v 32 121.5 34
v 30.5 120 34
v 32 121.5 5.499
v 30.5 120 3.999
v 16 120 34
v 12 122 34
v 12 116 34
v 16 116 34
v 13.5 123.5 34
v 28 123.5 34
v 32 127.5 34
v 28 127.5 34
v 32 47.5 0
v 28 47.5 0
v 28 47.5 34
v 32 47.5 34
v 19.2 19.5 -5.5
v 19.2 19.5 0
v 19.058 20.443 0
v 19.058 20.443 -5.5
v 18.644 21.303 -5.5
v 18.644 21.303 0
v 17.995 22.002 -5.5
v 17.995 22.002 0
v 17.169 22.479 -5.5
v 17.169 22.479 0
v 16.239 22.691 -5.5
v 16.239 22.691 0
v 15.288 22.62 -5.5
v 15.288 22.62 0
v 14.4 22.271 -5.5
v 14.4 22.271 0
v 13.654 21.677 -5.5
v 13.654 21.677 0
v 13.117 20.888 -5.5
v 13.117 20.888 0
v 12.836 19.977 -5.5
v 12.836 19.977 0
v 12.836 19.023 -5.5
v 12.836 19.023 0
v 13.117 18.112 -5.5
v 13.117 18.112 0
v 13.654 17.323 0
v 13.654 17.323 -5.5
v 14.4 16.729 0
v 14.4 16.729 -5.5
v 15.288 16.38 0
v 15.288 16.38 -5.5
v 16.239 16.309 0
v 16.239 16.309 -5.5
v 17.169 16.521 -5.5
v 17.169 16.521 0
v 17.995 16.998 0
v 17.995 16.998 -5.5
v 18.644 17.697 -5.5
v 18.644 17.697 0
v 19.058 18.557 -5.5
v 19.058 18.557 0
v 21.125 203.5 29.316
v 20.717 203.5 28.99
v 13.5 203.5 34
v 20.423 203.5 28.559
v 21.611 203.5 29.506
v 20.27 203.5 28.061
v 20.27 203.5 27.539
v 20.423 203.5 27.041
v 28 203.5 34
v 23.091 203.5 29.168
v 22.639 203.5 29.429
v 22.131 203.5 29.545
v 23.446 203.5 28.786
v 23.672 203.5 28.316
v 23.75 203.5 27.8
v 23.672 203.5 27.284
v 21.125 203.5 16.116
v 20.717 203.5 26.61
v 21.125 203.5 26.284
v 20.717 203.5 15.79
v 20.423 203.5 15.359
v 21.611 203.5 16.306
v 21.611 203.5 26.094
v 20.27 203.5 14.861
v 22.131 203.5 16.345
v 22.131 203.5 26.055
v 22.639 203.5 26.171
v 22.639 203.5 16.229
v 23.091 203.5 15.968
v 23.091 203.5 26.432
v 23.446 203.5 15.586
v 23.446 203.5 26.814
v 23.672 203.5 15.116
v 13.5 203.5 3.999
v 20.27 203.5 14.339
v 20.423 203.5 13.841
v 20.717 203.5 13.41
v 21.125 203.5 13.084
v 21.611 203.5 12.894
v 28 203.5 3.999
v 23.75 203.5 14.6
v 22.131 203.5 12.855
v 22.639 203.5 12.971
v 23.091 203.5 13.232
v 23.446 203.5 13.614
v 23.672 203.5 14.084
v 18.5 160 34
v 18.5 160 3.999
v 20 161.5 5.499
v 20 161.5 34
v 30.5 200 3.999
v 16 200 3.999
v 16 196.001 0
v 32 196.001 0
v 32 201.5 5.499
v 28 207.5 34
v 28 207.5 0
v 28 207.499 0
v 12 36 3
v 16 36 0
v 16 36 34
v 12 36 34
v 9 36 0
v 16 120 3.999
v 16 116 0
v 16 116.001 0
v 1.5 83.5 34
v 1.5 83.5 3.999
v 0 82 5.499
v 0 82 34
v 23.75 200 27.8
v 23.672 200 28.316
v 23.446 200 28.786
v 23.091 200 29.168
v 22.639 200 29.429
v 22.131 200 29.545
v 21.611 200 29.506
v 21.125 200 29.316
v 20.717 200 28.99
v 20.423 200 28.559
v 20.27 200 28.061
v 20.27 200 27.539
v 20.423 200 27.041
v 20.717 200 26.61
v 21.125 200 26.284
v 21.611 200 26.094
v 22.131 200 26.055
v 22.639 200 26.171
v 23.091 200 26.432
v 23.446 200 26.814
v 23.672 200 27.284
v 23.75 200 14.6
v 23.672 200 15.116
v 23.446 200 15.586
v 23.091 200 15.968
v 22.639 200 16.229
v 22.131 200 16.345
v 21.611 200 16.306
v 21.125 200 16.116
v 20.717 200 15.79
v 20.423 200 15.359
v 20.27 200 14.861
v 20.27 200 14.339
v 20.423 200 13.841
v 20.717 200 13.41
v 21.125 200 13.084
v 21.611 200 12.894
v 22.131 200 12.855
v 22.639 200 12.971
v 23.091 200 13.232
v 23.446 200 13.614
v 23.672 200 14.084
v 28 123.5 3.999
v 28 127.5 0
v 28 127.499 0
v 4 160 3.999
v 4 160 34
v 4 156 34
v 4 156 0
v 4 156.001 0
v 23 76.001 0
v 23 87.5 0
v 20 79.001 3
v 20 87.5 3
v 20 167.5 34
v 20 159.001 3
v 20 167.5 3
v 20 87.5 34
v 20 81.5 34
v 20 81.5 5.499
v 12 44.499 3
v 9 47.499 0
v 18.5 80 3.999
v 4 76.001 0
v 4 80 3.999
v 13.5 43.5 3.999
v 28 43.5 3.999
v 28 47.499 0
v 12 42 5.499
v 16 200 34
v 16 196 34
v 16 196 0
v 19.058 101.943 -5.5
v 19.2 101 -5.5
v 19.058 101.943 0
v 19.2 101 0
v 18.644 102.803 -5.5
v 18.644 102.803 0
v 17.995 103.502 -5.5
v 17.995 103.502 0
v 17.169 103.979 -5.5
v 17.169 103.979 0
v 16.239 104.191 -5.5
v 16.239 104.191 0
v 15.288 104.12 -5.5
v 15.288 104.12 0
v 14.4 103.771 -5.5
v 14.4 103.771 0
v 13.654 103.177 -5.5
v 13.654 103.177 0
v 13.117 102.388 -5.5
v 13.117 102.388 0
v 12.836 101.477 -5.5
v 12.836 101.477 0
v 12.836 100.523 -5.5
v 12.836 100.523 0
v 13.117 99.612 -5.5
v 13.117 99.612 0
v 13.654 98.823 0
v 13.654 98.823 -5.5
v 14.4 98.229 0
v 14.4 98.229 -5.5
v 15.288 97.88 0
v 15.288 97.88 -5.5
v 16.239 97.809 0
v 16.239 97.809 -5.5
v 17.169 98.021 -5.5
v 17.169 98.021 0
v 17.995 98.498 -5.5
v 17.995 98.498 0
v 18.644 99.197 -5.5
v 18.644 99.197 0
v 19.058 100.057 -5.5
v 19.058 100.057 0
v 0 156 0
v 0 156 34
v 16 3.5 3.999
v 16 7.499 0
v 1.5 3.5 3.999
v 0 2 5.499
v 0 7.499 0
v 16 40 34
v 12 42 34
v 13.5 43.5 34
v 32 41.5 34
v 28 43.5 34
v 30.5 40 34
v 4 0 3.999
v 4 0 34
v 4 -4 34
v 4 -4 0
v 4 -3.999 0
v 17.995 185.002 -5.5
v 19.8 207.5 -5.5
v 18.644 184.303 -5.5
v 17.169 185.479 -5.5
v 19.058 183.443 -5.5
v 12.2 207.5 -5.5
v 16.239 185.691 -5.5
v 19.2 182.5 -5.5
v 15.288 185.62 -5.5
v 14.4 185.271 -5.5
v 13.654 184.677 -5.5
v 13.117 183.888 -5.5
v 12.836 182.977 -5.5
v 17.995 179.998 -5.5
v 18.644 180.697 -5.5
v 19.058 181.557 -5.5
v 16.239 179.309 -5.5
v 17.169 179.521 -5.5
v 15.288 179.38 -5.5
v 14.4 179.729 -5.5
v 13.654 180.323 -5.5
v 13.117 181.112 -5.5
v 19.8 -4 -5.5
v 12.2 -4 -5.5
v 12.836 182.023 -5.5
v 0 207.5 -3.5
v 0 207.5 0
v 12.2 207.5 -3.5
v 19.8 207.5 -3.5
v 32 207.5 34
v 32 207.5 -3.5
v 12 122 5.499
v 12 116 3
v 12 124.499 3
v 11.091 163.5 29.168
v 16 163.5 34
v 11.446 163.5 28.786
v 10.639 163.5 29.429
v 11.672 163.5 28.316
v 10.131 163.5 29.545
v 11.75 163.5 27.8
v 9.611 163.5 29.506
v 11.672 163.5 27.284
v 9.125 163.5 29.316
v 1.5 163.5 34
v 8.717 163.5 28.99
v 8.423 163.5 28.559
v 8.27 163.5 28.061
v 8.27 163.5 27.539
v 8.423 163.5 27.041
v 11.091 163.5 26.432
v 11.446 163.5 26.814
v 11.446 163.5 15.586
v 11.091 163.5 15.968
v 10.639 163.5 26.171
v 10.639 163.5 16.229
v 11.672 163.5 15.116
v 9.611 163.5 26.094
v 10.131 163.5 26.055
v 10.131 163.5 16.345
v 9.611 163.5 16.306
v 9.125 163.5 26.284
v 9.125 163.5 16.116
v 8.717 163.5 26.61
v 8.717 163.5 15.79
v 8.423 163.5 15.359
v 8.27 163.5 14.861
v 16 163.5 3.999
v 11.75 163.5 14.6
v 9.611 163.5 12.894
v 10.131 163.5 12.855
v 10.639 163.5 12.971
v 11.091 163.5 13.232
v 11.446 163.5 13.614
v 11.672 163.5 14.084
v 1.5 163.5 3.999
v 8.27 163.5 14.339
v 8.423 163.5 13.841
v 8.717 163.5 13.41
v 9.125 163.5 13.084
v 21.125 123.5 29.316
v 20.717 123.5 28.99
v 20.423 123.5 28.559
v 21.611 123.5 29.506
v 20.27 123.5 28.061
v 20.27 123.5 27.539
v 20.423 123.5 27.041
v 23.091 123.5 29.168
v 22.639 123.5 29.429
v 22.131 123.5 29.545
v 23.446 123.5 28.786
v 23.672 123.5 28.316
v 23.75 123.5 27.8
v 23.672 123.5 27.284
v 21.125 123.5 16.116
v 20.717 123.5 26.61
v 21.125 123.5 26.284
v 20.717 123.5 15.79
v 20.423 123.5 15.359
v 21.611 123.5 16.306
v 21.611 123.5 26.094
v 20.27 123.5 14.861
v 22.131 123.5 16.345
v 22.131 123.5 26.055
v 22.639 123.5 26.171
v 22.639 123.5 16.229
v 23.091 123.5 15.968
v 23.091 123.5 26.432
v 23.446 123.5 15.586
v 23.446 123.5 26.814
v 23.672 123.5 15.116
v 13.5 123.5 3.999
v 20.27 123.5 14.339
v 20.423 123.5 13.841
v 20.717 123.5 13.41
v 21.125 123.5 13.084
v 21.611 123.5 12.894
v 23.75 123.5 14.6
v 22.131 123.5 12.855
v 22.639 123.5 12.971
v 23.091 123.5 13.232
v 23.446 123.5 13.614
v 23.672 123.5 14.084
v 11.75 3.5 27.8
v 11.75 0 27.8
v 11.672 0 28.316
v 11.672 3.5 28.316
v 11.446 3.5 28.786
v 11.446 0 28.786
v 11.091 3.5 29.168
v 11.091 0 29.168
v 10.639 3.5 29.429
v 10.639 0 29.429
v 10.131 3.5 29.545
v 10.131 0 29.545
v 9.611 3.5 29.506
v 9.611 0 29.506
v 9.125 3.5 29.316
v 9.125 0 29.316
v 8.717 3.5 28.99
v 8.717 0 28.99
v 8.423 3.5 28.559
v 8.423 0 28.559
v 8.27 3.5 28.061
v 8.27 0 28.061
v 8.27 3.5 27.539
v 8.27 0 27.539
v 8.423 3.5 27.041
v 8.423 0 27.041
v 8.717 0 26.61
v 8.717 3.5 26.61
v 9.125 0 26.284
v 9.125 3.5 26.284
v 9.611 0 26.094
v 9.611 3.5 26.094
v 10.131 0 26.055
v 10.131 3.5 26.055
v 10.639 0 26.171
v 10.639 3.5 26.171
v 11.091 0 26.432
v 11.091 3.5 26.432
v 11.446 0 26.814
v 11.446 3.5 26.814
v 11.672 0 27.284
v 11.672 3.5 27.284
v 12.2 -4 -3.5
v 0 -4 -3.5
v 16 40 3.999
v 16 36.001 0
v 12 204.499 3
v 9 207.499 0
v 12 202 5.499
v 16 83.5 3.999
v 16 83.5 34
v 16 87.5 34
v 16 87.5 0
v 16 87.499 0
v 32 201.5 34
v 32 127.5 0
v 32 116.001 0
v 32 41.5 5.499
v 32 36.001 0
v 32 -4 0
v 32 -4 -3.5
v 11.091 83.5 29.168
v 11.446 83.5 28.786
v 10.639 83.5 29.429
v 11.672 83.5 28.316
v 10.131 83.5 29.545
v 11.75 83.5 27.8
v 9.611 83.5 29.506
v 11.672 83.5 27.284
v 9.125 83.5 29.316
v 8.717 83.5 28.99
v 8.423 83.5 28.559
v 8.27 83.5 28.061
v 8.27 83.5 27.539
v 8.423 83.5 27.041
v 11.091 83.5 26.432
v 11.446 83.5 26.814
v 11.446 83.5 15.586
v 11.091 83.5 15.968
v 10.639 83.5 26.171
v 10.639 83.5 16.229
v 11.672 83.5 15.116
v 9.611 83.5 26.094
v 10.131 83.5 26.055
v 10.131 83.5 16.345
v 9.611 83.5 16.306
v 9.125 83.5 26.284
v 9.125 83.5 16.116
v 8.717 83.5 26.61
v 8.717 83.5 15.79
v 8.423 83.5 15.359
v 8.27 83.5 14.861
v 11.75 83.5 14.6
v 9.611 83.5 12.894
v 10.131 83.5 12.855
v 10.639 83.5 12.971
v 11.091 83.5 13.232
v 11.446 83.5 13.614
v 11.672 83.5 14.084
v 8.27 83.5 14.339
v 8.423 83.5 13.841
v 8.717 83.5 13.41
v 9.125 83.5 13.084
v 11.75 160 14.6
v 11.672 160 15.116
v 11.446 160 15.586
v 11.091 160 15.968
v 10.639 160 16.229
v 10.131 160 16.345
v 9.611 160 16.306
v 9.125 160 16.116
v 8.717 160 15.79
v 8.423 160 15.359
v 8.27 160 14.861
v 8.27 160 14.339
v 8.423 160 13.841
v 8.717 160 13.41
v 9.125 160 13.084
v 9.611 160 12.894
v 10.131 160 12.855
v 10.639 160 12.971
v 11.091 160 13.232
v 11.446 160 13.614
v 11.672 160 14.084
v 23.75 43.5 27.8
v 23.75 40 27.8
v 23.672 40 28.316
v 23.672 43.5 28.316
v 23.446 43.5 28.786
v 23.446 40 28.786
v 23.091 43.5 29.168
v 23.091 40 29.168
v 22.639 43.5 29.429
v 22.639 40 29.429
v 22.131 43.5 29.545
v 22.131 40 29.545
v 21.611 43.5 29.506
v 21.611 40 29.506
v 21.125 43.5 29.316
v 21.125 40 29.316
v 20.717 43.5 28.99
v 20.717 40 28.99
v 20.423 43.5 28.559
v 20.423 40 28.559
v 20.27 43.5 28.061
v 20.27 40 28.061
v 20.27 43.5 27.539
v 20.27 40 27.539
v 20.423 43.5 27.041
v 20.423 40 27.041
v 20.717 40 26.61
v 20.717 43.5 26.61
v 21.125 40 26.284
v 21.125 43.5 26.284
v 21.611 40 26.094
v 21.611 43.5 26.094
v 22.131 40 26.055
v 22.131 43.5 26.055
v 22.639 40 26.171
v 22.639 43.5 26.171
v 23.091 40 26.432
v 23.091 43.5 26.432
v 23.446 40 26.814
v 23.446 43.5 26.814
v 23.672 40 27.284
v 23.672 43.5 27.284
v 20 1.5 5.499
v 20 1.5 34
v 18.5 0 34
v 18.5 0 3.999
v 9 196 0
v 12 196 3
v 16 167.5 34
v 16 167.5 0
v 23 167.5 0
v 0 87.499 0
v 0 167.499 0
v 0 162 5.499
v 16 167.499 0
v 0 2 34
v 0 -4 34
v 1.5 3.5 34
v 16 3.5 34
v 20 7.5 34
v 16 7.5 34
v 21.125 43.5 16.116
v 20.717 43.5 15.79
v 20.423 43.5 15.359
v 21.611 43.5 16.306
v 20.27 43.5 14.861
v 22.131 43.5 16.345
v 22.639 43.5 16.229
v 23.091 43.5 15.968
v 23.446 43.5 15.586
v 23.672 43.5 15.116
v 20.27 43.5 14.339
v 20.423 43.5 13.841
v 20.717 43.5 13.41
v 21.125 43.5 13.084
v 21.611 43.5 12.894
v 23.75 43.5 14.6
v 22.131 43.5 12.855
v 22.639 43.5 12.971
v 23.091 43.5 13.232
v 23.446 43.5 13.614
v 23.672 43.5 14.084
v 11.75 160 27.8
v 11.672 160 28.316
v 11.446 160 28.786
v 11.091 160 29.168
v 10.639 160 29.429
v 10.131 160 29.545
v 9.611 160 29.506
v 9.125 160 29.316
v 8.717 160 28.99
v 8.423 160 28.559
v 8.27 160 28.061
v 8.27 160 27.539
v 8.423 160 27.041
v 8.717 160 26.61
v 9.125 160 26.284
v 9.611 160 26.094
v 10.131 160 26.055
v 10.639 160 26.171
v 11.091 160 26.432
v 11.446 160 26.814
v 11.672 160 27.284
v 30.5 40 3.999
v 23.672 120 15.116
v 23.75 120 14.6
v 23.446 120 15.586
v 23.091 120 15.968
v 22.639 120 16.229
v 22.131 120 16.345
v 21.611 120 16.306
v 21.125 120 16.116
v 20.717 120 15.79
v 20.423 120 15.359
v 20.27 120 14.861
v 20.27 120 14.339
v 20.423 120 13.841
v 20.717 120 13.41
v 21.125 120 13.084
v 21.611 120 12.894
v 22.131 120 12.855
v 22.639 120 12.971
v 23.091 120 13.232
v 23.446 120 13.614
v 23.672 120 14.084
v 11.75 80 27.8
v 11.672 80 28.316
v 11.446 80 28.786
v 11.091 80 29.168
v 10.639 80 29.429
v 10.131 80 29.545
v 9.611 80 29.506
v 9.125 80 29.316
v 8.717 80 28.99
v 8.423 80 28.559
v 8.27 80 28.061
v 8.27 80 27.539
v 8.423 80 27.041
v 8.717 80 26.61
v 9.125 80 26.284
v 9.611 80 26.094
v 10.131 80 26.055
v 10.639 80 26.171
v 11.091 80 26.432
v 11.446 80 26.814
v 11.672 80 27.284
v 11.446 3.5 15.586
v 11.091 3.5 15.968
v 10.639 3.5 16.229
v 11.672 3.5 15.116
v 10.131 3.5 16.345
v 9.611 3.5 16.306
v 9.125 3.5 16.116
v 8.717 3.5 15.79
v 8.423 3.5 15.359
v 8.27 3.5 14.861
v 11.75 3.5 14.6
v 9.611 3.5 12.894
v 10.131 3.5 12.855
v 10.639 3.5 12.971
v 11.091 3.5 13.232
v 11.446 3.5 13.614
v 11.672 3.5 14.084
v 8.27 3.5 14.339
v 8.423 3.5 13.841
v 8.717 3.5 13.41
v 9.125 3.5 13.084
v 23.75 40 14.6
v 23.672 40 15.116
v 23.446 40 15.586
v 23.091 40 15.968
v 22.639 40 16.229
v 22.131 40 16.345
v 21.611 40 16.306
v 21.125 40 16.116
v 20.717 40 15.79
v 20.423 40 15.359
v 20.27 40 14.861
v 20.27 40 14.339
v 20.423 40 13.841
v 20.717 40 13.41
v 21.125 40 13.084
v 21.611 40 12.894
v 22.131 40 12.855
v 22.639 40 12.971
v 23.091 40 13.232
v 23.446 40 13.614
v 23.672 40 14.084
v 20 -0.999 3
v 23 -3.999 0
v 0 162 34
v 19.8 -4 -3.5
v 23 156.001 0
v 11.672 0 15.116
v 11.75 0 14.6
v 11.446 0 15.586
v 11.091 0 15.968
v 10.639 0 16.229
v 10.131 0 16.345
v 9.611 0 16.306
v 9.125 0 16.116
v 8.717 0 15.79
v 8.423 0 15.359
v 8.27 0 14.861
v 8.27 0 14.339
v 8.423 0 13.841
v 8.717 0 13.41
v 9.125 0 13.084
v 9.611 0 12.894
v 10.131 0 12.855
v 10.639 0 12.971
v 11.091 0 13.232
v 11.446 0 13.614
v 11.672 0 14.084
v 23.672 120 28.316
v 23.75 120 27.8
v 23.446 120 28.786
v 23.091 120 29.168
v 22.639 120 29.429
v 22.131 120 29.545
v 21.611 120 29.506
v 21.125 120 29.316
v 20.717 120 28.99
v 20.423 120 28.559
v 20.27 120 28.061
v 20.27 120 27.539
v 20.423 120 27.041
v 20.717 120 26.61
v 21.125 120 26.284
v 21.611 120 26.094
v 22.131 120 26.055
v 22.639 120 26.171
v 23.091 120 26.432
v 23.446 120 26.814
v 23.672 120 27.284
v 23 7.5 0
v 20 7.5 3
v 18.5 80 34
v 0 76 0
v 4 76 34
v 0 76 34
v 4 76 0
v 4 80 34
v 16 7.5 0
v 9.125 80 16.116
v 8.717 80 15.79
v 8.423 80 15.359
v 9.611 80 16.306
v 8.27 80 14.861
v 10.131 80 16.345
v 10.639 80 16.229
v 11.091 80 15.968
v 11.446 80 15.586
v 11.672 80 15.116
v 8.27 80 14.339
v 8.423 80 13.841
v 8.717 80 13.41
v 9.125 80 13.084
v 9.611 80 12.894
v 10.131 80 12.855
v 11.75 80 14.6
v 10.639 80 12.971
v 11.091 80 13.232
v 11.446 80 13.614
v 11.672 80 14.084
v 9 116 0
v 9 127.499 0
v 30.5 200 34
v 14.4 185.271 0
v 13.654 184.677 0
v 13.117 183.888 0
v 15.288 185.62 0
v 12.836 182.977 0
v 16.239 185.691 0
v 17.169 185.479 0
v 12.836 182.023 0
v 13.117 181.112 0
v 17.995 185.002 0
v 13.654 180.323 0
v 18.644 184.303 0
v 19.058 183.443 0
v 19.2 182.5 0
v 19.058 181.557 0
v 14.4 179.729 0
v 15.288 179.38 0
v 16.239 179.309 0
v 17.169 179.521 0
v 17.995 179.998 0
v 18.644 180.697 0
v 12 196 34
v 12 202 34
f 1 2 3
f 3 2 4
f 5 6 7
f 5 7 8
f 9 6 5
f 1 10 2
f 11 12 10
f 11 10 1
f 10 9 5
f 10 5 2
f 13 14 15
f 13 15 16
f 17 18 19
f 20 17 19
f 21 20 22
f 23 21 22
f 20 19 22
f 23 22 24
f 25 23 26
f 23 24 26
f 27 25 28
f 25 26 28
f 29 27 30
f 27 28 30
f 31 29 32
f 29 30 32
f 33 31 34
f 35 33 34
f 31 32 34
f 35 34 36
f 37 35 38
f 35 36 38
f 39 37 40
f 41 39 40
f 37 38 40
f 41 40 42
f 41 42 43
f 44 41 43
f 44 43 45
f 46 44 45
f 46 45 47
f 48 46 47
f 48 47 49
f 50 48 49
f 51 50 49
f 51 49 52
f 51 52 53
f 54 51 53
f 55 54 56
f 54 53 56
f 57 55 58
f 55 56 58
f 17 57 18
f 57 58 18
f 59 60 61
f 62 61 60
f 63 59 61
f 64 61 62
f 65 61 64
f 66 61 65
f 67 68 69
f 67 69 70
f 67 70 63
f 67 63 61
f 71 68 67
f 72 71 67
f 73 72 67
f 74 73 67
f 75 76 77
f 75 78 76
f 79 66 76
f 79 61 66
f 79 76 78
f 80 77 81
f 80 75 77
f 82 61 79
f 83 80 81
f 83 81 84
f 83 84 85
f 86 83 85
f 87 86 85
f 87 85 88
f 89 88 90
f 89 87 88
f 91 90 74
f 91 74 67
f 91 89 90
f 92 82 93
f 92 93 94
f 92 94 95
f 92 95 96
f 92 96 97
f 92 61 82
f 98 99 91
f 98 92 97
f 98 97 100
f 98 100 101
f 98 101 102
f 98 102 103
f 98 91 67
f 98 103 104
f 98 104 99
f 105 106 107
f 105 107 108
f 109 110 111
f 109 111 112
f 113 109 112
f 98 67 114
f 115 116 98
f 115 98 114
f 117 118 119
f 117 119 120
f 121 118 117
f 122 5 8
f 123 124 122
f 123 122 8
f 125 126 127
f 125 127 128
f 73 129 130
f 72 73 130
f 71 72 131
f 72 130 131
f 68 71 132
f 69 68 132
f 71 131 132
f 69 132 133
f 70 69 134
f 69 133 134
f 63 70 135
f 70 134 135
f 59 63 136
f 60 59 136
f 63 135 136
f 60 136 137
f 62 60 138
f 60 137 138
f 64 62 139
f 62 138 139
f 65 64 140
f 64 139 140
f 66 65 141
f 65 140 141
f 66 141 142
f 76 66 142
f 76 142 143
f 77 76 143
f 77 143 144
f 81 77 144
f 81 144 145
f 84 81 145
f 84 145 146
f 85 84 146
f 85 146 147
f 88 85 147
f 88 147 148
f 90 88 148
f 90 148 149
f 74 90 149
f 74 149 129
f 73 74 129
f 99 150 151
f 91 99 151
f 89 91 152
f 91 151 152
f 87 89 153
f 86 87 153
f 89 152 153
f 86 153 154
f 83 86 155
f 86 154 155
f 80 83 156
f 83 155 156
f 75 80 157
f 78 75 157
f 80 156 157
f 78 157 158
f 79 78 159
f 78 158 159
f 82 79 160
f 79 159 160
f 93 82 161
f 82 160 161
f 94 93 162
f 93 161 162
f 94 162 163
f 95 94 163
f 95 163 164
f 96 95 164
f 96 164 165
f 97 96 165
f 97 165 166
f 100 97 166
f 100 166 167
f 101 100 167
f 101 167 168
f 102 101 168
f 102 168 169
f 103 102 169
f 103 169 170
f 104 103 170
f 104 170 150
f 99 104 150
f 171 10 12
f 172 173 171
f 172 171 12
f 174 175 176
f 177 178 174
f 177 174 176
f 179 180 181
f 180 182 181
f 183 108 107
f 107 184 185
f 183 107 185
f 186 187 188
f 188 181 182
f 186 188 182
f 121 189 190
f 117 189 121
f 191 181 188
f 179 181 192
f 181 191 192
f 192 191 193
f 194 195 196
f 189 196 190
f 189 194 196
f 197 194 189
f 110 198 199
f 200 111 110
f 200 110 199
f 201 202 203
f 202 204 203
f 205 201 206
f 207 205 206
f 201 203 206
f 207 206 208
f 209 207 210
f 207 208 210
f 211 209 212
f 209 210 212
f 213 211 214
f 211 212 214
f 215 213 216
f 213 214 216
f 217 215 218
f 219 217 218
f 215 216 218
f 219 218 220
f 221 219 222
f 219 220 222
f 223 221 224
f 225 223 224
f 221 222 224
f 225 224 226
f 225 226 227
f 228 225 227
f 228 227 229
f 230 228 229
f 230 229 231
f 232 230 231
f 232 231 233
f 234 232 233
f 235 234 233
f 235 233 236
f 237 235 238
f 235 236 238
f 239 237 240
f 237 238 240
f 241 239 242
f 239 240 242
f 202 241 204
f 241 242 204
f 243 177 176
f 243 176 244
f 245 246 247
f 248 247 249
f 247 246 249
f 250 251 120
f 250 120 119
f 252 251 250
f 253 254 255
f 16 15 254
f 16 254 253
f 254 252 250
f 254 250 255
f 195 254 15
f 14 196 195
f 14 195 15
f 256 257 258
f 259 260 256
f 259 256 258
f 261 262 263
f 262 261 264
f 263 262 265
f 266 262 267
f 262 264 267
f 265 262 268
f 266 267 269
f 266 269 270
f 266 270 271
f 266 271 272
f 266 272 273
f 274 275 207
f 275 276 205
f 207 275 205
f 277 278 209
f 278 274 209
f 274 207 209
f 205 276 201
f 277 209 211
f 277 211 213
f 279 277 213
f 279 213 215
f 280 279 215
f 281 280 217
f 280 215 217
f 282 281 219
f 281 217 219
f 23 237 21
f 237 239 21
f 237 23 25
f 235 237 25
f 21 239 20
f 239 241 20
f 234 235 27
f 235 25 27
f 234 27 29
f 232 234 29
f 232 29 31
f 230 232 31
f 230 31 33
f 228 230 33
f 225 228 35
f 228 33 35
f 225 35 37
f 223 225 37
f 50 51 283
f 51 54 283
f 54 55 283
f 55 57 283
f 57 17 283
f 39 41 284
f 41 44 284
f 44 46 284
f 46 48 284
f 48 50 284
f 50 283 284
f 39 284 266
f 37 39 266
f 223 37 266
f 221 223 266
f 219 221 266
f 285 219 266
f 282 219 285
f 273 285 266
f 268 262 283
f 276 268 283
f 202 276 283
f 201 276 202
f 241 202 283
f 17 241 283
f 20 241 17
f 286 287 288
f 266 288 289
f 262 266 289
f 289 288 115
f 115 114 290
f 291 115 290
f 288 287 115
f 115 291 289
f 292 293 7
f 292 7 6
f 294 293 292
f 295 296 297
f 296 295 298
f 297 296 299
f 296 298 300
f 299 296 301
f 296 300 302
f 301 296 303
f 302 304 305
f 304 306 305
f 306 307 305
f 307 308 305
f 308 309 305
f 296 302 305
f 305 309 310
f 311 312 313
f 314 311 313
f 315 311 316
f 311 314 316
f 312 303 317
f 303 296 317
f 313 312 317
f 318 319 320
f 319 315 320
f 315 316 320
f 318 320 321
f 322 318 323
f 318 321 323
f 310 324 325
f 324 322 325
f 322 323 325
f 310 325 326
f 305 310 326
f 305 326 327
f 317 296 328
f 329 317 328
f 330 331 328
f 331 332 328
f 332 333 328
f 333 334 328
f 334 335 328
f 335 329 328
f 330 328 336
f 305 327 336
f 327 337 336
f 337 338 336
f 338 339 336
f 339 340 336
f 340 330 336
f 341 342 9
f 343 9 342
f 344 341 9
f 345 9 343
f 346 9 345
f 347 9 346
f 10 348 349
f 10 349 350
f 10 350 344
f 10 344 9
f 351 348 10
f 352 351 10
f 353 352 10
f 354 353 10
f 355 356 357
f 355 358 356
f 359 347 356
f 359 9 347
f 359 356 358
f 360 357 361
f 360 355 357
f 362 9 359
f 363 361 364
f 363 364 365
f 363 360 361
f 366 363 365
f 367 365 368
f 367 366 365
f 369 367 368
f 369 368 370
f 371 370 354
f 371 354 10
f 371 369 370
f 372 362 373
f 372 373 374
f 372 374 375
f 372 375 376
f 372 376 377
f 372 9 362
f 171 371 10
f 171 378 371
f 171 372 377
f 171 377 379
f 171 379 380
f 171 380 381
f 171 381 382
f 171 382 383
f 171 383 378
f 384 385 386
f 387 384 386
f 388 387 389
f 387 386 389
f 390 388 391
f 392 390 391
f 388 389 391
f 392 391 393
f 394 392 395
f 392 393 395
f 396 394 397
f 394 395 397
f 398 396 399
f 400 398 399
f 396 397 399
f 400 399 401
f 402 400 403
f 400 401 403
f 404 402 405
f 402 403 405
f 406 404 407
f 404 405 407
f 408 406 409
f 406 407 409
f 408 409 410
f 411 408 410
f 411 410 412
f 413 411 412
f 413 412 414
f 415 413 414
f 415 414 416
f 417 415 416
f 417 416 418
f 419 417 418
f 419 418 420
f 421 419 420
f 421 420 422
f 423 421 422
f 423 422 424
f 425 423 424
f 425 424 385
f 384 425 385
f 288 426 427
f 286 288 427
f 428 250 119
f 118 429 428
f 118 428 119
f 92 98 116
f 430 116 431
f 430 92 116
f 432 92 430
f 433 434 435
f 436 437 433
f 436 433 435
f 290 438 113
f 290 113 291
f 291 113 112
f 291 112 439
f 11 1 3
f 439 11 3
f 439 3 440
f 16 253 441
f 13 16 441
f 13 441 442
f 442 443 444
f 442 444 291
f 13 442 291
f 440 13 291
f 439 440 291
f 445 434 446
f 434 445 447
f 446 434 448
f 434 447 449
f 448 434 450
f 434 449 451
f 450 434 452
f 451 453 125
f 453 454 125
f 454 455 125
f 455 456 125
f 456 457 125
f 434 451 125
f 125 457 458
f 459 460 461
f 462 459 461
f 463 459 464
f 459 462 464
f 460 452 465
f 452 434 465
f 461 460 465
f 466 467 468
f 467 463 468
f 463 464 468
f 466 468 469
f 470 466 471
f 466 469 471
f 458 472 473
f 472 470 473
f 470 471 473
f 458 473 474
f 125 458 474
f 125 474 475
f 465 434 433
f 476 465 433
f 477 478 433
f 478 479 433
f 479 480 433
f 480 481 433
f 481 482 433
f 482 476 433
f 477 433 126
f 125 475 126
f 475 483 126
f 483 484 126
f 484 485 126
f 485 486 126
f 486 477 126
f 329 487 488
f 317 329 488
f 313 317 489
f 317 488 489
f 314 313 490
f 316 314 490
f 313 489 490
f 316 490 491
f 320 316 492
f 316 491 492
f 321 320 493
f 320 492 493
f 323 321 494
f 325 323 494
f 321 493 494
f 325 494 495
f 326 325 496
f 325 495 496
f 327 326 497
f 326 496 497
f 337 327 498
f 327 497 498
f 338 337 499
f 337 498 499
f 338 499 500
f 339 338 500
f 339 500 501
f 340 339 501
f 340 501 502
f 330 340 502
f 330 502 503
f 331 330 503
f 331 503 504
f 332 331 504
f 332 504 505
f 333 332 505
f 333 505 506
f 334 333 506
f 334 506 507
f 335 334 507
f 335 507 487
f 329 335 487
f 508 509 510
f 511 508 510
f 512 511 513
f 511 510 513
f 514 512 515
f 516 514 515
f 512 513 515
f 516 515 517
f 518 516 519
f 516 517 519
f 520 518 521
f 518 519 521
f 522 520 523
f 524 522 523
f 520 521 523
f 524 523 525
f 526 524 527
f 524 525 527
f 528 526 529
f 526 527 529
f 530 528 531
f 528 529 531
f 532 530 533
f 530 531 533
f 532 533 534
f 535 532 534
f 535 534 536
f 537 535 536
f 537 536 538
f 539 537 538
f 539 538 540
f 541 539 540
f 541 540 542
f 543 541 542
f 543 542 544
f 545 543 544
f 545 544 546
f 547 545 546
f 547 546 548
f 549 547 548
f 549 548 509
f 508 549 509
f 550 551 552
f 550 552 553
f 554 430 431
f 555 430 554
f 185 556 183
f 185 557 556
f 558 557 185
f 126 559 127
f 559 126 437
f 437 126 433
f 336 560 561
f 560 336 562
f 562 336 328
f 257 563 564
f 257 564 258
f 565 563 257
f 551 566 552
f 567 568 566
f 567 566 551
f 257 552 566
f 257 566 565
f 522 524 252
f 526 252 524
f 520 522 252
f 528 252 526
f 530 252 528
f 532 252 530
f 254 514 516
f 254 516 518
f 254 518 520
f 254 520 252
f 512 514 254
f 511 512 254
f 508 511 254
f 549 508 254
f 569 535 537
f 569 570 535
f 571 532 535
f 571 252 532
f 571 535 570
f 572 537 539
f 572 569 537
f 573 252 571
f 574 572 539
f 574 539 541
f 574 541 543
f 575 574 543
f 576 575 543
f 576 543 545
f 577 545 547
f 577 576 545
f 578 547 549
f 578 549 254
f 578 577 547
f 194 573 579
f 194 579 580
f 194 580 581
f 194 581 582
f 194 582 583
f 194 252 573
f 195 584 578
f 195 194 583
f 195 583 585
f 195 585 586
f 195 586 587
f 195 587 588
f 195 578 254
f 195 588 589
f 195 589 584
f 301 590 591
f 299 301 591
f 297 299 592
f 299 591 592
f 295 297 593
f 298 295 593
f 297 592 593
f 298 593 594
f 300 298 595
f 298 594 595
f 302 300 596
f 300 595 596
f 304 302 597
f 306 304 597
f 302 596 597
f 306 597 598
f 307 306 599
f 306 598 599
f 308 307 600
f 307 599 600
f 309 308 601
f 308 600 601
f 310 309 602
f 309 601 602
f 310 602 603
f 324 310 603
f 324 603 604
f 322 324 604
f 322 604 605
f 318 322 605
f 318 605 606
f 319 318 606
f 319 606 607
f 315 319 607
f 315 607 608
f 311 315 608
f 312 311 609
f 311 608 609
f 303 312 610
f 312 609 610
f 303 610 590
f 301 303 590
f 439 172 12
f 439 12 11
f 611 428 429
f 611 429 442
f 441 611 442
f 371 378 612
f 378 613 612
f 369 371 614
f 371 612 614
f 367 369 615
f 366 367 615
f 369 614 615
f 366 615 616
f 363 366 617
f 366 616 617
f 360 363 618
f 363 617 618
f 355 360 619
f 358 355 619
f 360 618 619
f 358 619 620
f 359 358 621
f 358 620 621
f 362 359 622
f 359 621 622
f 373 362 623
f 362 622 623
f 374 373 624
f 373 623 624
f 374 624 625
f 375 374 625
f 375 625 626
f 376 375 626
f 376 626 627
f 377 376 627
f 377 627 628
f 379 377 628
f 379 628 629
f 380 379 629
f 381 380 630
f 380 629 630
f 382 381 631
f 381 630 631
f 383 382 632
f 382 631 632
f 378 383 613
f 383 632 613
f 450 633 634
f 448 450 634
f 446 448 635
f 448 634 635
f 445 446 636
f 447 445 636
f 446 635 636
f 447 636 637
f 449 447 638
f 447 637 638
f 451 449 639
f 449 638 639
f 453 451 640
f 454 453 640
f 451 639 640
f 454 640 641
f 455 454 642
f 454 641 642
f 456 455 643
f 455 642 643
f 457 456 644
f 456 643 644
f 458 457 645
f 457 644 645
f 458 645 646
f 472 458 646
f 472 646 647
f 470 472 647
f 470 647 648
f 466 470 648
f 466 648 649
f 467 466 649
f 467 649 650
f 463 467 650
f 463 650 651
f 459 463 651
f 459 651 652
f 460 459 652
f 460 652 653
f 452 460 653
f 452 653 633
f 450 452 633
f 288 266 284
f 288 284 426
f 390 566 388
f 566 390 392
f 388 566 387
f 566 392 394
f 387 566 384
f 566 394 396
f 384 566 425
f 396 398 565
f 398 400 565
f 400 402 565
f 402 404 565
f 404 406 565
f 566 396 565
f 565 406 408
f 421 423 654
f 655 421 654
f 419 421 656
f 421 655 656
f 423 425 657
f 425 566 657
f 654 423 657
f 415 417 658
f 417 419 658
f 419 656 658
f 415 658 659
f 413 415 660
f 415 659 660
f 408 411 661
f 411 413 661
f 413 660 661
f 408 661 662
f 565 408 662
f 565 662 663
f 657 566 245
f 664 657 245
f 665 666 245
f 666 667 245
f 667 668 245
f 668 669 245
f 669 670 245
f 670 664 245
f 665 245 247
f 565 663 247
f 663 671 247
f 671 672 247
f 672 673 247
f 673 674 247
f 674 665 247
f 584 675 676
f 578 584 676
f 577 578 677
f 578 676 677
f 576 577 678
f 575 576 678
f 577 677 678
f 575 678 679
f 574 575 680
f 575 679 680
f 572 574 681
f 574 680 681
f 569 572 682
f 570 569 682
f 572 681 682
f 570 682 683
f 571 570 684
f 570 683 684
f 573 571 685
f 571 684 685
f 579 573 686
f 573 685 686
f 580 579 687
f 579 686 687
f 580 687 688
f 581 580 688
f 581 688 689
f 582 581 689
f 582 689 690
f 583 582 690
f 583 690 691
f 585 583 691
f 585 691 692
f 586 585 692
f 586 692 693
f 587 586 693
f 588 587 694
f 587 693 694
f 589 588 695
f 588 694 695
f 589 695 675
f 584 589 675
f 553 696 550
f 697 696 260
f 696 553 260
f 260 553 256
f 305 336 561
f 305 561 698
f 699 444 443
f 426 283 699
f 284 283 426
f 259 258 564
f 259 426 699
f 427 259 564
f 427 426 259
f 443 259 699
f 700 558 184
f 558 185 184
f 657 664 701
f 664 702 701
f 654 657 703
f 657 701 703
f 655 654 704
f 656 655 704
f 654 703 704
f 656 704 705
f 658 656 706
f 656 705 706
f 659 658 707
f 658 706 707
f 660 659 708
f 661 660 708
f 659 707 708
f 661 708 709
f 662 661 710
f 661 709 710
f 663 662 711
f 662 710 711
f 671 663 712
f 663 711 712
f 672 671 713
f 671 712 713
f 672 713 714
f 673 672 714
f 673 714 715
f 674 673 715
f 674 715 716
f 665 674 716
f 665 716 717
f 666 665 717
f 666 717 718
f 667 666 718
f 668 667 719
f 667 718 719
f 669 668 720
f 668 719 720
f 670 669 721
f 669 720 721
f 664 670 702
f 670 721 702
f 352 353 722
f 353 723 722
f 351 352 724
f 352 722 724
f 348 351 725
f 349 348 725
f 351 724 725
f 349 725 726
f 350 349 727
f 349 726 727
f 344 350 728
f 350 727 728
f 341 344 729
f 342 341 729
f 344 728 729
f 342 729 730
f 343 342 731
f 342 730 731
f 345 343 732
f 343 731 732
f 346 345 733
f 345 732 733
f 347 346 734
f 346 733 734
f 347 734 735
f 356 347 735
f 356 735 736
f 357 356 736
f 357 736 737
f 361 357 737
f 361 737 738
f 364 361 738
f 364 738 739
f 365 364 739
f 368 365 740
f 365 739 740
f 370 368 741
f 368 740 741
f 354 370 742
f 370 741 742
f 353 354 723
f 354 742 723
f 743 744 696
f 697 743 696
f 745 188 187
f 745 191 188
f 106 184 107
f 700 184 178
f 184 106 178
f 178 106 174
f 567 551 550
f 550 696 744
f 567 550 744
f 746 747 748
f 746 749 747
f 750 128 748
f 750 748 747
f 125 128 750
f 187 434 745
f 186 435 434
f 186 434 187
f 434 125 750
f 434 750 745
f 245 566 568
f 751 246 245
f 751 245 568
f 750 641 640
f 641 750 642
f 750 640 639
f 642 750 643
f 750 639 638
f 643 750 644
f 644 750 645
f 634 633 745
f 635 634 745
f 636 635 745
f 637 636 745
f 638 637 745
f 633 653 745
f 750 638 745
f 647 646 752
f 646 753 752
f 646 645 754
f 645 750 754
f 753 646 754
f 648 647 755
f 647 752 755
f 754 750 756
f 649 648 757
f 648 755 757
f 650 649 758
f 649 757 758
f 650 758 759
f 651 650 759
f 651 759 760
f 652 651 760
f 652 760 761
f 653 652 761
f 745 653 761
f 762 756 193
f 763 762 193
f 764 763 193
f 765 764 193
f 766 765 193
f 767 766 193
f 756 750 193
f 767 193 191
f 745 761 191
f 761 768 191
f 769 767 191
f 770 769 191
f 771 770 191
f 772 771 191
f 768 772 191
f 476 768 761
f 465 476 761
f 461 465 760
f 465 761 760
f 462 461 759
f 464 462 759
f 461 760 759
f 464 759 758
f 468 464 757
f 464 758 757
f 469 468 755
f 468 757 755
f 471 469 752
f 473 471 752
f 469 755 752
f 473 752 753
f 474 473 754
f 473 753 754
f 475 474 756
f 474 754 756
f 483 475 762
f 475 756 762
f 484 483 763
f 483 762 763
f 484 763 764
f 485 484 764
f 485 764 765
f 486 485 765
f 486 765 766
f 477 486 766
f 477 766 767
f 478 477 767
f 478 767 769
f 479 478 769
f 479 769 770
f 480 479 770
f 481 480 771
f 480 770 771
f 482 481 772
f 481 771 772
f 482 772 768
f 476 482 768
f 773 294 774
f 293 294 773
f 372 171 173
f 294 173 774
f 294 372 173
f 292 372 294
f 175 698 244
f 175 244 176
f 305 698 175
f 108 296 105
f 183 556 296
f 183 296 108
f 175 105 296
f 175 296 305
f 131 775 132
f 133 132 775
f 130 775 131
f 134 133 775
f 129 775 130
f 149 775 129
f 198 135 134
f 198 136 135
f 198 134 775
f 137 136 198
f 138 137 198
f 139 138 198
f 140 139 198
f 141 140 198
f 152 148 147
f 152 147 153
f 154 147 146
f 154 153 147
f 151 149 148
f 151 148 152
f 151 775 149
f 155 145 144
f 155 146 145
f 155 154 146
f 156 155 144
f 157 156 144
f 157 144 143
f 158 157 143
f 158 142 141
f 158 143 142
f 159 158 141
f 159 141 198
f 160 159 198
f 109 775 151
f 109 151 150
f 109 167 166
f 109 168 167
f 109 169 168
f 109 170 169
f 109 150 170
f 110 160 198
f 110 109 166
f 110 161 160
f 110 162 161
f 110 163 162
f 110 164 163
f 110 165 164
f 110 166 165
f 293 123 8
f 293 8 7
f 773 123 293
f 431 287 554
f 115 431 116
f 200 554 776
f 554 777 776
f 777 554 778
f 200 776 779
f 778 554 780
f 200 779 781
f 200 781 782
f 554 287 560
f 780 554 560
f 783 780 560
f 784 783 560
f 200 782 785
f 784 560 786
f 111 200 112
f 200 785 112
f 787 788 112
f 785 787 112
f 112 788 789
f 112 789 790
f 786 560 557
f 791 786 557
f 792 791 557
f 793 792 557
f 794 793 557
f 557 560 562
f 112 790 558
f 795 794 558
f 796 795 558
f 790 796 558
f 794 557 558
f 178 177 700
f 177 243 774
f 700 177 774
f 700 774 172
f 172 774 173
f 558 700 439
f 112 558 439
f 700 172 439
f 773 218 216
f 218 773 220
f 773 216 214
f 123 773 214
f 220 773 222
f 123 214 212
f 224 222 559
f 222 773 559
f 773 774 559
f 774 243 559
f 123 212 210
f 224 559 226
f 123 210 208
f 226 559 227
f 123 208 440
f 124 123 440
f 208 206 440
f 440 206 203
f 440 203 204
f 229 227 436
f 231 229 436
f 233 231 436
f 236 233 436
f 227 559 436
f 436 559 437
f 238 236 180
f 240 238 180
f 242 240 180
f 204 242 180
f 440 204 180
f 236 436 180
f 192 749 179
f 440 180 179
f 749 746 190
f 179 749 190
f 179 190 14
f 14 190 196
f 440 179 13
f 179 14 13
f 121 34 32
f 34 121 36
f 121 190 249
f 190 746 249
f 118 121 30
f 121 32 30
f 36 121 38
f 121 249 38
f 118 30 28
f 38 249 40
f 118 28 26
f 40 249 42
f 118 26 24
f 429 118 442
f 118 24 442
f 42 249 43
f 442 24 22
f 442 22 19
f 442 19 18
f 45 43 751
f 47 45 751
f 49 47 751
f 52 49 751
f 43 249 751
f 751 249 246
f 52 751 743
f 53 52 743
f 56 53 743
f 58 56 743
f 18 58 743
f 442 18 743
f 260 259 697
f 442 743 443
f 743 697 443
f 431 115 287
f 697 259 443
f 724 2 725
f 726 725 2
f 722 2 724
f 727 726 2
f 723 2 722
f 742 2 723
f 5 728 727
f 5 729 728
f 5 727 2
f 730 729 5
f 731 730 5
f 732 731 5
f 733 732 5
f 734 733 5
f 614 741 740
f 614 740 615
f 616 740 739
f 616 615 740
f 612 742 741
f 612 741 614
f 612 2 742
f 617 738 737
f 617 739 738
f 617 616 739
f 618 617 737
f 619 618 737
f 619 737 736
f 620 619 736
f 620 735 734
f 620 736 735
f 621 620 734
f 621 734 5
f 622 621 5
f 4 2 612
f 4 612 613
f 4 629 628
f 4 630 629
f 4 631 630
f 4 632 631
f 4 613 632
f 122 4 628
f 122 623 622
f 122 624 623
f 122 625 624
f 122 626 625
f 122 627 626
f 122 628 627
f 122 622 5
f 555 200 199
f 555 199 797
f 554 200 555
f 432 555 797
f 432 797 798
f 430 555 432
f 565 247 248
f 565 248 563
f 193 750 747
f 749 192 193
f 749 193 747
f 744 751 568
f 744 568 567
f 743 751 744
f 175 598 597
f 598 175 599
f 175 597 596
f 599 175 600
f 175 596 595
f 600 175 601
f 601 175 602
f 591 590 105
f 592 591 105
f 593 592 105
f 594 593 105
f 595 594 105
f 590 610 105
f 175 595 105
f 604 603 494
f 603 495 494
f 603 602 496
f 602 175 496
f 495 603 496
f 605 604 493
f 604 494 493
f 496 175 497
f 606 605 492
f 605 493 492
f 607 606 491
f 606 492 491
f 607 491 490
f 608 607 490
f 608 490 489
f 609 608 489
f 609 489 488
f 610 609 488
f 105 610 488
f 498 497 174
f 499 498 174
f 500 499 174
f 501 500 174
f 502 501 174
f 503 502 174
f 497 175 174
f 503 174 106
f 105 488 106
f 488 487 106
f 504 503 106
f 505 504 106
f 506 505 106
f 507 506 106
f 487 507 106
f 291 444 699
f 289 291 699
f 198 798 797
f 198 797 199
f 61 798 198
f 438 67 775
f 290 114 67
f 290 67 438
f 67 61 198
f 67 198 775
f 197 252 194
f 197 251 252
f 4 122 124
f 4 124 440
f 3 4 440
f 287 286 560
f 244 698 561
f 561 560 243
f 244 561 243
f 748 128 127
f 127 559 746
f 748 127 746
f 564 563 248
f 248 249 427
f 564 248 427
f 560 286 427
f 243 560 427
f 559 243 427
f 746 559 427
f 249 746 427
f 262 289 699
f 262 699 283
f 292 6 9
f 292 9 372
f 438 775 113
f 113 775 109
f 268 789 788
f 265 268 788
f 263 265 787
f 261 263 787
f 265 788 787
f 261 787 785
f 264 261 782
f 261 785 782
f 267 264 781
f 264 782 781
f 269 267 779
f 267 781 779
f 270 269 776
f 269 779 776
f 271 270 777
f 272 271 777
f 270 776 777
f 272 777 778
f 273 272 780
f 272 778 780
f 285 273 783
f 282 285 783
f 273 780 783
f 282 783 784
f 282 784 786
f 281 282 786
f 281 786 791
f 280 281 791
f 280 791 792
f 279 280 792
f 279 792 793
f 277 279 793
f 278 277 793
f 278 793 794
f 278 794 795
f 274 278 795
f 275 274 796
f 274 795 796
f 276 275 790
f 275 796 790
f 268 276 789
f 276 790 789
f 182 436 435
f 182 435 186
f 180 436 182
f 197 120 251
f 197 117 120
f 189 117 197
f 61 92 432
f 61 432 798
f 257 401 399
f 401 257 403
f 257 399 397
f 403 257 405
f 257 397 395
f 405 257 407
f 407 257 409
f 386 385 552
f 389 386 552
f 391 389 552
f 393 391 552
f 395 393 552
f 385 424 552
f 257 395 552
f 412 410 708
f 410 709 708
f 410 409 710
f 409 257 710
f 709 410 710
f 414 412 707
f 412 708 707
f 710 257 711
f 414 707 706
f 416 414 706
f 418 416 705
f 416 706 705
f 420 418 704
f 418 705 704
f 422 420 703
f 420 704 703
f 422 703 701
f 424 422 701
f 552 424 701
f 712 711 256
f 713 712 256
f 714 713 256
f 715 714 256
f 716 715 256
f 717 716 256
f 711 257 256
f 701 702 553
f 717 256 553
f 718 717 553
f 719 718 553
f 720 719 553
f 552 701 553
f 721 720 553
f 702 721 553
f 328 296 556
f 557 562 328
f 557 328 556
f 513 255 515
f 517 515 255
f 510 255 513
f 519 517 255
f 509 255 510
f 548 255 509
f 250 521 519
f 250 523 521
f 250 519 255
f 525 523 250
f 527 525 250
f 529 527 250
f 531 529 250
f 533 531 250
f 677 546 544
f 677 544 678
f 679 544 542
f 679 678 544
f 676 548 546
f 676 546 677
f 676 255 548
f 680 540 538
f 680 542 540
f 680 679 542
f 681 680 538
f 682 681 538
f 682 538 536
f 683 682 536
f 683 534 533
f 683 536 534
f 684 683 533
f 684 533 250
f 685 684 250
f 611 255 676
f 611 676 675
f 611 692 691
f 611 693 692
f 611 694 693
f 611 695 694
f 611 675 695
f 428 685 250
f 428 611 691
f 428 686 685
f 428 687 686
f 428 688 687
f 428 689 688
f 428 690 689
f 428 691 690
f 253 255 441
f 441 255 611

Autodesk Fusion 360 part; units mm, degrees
sketch "Sketch1" plane through (0, 0, 0) normal (0, 0, 1) x (1, 0, 0)
  line L0 (0, 0) -> (20, 0)
  line L1 (20, 0) -> (20, 3.5)
  line L2 (20, 3.5) -> (0, 3.5)
  line L3 (0, 3.5) -> (0, 0)
  line L4 (0, 0) -> (4, 0)
  line L5 (4, 0) -> (4, -4)
  line L6 (4, -4) -> (0, -4)
  line L7 (0, -4) -> (0, 0)
  line L8 (20, 3.5) -> (16, 3.5)
  line L9 (16, 3.5) -> (16, 7.5)
  line L10 (16, 7.5) -> (20, 7.5)
  line L11 (20, 7.5) -> (20, 3.5)
  dimension "d1" = 3.5
  dimension "d2" = 20
  dimension "d3" = 4
  dimension "d4" = 4
  dimension "d5" = 4
  dimension "d6" = 4
extrude "Extrude1" add sketch "Sketch1" along normal blind 34 makes body 1
sketch "Sketch2" plane through (0, 0, 0) normal (0, -1, 0) x (1, 0, 0)
  line L0 (4, 0) -> (20, 0)
  line L1 (20, 0) -> (20, 34)
  line L2 (20, 34) -> (4, 34)
  line L3 (4, 34) -> (4, 0)
  circle A0 centre (10, 27.8) radius 1.75
  circle A1 centre (10, 14.6) radius 1.75
  line L4 (16, 34) -> (4, 34) construction
  point P0 (16, 34)
  point P1 (10, 34)
  dimension "d9" = 3.5
  dimension "d10" = 6.2
  dimension "d11" = 13.2
  dimension "d12" = 3.5
extrude "Extrude2" cut sketch "Sketch2" against normal blind 15 contours A0 | A1 bodies 1
pattern_linear "R-Pattern1" count 3 spacing 80 along (0, 1, 0) of bodies 1 makes body 2 at (8.5369, 83.5, 4.298) makes body 3 at (8.5369, 163.5, 4.298)
sketch "Sketch3" plane through (0, 0, 0) normal (0, 0, 1) x (1, 0, 0)
  line L0 (12, 43.5) -> (32, 43.5)
  line L1 (32, 43.5) -> (32, 40)
  line L2 (32, 40) -> (12, 40)
  line L3 (12, 40) -> (12, 43.5)
  line L4 (12, 40) -> (16, 40)
  line L5 (16, 40) -> (16, 36)
  line L6 (16, 36) -> (12, 36)
  line L7 (12, 36) -> (12, 40)
  line L8 (32, 43.5) -> (28, 43.5)
  line L9 (28, 43.5) -> (28, 47.5)
  line L10 (28, 47.5) -> (32, 47.5)
  line L11 (32, 47.5) -> (32, 43.5)
  line L12 (0, 3.5) -> (0, -4)
  line L13 (4, 0) -> (20, 0)
  dimension "d19" = 20
  dimension "d20" = 3.5
  dimension "d21" = 4
  dimension "d22" = 4
  dimension "d23" = 4
  dimension "d24" = 4
  dimension "d25" = 12
  dimension "d26" = 40
extrude "Extrude3" add sketch "Sketch3" along normal blind 34 separate body makes body 4
sketch "Sketch4" plane through (0, 40, 0) normal (0, -1, 0) x (1, 0, 0)
  line L0 (16, 0) -> (32, 0)
  line L1 (32, 0) -> (32, 34)
  line L2 (32, 34) -> (16, 34)
  line L3 (16, 34) -> (16, 0)
  circle A0 centre (22, 27.8) radius 1.75
  circle A1 centre (22, 14.6) radius 1.75
  line L4 (28, 34) -> (16, 34)
  point P0 (28, 34)
  point P1 (22, 34)
  dimension "d29" = 3.5
  dimension "d30" = 3.5
  dimension "d31" = 6.2
  dimension "d32" = 13.2
extrude "Extrude4" cut sketch "Sketch4" against normal blind 5 contours A0 | A1 bodies 4
pattern_linear "R-Pattern2" count 3 spacing 80 along (0, 1, 0) of bodies 4 makes body 5 at (20.5369, 123.5, 4.298) makes body 6 at (20.5369, 203.5, 4.298)
sketch "Sketch5" plane through (0, 0, 0) normal (0, -1, 0) x (1, 0, 0)
  circle A0 centre (10, 27.8) radius 1.75
  circle A1 centre (10, 14.6) radius 1.75
  line L0 (4, 0) -> (20, 0)
  line L1 (20, 0) -> (20, 34)
  line L2 (20, 34) -> (4, 34)
  line L3 (4, 34) -> (4, 0)
  line L4 (0, 0) -> (32, 0)
  line L5 (32, 0) -> (32, -3.5)
  line L6 (32, -3.5) -> (0, -3.5)
  line L7 (0, -3.5) -> (0, 0)
  line L8 (12.2, -3.5) -> (19.8, -3.5)
  line L9 (19.8, -3.5) -> (19.8, -5.5)
  line L10 (19.8, -5.5) -> (12.2, -5.5)
  line L11 (12.2, -5.5) -> (12.2, -3.5)
  point P0 (32, 0)
  point P1 (16, -3.5)
  point P2 (16, -3.5)
  dimension "d39" = 3.5
  dimension "d40" = 7.6
  dimension "d41" = 2
extrude "Extrude5" add sketch "Sketch5" along normal blind -207.5 and the other way up to surface (-4 mm away) contours L0 L4 L5 L6 L7 L8 | L6 L8 L9 L10 L11 bodies 1 2 3 4 5 6
sketch "Sketch6" plane through (0, 0, 0) normal (0, 0, 1) x (1, 0, 0)
  line L0 (32, 200) -> (16, 200)
  line L1 (16, 200) -> (16, 196)
  line L2 (16, 196) -> (12, 196)
  line L3 (12, 196) -> (12, 203.5)
  line L4 (12, 203.5) -> (28, 203.5)
  line L5 (28, 203.5) -> (28, 207.5)
  line L6 (28, 207.5) -> (0, 207.5)
  line L7 (0, 207.5) -> (0, 163.5)
  line L8 (0, 163.5) -> (16, 163.5)
  line L9 (16, 163.5) -> (16, 167.5)
  line L10 (16, 167.5) -> (20, 167.5)
  line L11 (20, 167.5) -> (20, 160)
  line L12 (20, 160) -> (4, 160)
  line L13 (4, 160) -> (4, 156)
  line L14 (4, 156) -> (0, 156)
  line L15 (0, 156) -> (0, 83.5)
  line L16 (0, 83.5) -> (16, 83.5)
  line L17 (16, 83.5) -> (16, 87.5)
  line L18 (16, 87.5) -> (20, 87.5)
  line L19 (20, 87.5) -> (20, 80)
  line L20 (20, 80) -> (4, 80)
  line L21 (4, 80) -> (4, 76)
  line L22 (4, 76) -> (0, 76)
  line L23 (0, 76) -> (0, 3.5)
  line L24 (0, 3.5) -> (16, 3.5)
  line L25 (16, 3.5) -> (16, 7.5)
  line L26 (16, 7.5) -> (20, 7.5)
  line L27 (20, 7.5) -> (20, 0)
  line L28 (20, 0) -> (4, 0)
  line L29 (4, 0) -> (4, -4)
  line L30 (4, -4) -> (32, -4)
  line L31 (32, -4) -> (32, 40)
  line L32 (32, 40) -> (16, 40)
  line L33 (16, 40) -> (16, 36)
  line L34 (16, 36) -> (12, 36)
  line L35 (12, 36) -> (12, 43.5)
  line L36 (12, 43.5) -> (28, 43.5)
  line L37 (28, 43.5) -> (28, 47.5)
  line L38 (28, 47.5) -> (32, 47.5)
  line L39 (32, 47.5) -> (32, 120)
  line L40 (32, 120) -> (16, 120)
  line L41 (16, 120) -> (16, 116)
  line L42 (16, 116) -> (12, 116)
  line L43 (12, 116) -> (12, 123.5)
  line L44 (12, 123.5) -> (28, 123.5)
  line L45 (28, 123.5) -> (28, 127.5)
  line L46 (28, 127.5) -> (32, 127.5)
  line L47 (32, 127.5) -> (32, 200)
  circle A0 centre (16, 182.5) radius 3.2
  line L48 (19.8, 207.5) -> (12.2, 207.5)
  circle A1 centre (16, 101) radius 3.2
  circle A2 centre (16, 19.5) radius 3.2
  point P0 (16, 207.5)
  dimension "d46" = 6.4
  dimension "d47" = 25
  dimension "d50" = 163
  dimension "d51" = 0
extrude "Extrude6" cut sketch "Sketch6" against normal blind 15 contours A0 | A1 | A2 bodies 1
chamfer "Chamfer1" distance 4 angle 45 12 edges at (12, 0, 0) (8, 3.5, 0) (24, 40, 0) (20, 43.5, 0) (12, 80, 0) (8, 83.5, 0) (20, 123.5, 0) (24, 120, 0) (12, 160, 0) (8, 163.5, 0) (24, 200, 0) (20, 203.5, 0) on bodies 1
chamfer "Chamfer2" distance 3 angle 45 6 edges at (12, 201.75, 0) (20, 161.75, 0) (20, 81.75, 0) (20, 1.75, 0) (12, 121.75, 0) (12, 41.75, 0) on bodies 1
chamfer "Chamfer3" distance 1.5 angle 45 12 edges at (32, 200, 19) (12, 203.5, 19) (20, 160, 19) (0, 163.5, 19) (12, 123.5, 19) (32, 120, 19) (20, 80, 19) (0, 83.5, 19) (12, 43.5, 19) (32, 40, 19) (20, 0, 19) (0, 3.5, 19) on bodies 1
equation "d12 = d9"
equation "d22 = d21"
equation "d23 = d21"
equation "d24 = d21"
